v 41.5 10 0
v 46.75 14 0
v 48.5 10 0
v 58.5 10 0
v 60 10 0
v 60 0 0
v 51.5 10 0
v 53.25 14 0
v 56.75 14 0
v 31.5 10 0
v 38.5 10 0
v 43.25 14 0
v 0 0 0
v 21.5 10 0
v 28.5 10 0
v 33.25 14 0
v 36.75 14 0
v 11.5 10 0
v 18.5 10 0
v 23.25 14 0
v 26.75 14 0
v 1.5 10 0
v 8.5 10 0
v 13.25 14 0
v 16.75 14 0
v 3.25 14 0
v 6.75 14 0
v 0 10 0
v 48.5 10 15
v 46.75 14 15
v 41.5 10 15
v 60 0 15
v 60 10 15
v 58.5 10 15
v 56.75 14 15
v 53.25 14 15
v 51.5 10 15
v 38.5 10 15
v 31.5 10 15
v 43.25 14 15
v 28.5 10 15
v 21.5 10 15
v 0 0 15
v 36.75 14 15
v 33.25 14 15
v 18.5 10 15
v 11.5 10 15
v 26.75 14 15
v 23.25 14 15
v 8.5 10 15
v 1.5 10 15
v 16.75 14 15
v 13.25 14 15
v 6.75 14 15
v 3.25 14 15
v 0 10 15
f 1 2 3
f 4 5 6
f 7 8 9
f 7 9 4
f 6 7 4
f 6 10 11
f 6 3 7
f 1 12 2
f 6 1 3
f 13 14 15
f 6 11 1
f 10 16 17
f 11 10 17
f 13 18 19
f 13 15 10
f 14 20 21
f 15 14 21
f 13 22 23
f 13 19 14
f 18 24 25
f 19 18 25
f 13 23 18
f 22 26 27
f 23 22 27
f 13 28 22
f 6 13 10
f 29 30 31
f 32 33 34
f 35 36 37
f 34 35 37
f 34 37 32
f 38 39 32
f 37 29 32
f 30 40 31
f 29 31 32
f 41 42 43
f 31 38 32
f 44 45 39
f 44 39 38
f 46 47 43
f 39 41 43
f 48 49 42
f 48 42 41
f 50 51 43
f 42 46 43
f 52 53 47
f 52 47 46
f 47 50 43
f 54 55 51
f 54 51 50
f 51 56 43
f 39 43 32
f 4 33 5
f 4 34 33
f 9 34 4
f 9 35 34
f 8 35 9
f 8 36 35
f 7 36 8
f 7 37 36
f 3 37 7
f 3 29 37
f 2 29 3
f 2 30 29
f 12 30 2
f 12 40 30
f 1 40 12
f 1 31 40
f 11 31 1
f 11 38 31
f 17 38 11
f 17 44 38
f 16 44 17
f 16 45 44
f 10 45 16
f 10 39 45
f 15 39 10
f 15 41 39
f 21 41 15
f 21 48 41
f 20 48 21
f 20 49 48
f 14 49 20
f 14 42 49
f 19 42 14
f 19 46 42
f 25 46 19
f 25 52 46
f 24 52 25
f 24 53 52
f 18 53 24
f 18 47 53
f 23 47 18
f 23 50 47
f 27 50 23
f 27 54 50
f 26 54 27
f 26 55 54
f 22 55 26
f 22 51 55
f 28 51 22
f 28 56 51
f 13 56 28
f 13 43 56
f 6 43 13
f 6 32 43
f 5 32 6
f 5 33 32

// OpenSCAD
$fn = 32;

// ----------------------------------------------------------------------
// Gear rack: 6 teeth, pitch 10 mm
// ----------------------------------------------------------------------

// --- parameters (mm) ---
teeth = 6;                // number of teeth
pitch = 10;               // tooth pitch, X
root_w = 7;               // tooth width at the root
tip_w = 3.5;              // tooth width at the tip
base_h = 10;              // rack body height, Y
tooth_h = 4;              // tooth height above the body
plate_t = 15;             // rack width, Z (extrusion height)

rack_l = teeth * pitch;  // overall length
total_h = base_h + tooth_h;  // overall height

profile = [[0, 0], [60, 0], [60, 10], [58.5, 10], [56.75, 14], [53.25, 14], [51.5, 10], [48.5, 10], [46.75, 14], [43.25, 14], [41.5, 10], [38.5, 10], [36.75, 14], [33.25, 14], [31.5, 10], [28.5, 10], [26.75, 14], [23.25, 14], [21.5, 10], [18.5, 10], [16.75, 14], [13.25, 14], [11.5, 10], [8.5, 10], [6.75, 14], [3.25, 14], [1.5, 10], [0, 10]];  // primary outline, 28 points, counter clockwise

// --- the one profile operation ---
linear_extrude(height = plate_t) polygon(points = profile);
